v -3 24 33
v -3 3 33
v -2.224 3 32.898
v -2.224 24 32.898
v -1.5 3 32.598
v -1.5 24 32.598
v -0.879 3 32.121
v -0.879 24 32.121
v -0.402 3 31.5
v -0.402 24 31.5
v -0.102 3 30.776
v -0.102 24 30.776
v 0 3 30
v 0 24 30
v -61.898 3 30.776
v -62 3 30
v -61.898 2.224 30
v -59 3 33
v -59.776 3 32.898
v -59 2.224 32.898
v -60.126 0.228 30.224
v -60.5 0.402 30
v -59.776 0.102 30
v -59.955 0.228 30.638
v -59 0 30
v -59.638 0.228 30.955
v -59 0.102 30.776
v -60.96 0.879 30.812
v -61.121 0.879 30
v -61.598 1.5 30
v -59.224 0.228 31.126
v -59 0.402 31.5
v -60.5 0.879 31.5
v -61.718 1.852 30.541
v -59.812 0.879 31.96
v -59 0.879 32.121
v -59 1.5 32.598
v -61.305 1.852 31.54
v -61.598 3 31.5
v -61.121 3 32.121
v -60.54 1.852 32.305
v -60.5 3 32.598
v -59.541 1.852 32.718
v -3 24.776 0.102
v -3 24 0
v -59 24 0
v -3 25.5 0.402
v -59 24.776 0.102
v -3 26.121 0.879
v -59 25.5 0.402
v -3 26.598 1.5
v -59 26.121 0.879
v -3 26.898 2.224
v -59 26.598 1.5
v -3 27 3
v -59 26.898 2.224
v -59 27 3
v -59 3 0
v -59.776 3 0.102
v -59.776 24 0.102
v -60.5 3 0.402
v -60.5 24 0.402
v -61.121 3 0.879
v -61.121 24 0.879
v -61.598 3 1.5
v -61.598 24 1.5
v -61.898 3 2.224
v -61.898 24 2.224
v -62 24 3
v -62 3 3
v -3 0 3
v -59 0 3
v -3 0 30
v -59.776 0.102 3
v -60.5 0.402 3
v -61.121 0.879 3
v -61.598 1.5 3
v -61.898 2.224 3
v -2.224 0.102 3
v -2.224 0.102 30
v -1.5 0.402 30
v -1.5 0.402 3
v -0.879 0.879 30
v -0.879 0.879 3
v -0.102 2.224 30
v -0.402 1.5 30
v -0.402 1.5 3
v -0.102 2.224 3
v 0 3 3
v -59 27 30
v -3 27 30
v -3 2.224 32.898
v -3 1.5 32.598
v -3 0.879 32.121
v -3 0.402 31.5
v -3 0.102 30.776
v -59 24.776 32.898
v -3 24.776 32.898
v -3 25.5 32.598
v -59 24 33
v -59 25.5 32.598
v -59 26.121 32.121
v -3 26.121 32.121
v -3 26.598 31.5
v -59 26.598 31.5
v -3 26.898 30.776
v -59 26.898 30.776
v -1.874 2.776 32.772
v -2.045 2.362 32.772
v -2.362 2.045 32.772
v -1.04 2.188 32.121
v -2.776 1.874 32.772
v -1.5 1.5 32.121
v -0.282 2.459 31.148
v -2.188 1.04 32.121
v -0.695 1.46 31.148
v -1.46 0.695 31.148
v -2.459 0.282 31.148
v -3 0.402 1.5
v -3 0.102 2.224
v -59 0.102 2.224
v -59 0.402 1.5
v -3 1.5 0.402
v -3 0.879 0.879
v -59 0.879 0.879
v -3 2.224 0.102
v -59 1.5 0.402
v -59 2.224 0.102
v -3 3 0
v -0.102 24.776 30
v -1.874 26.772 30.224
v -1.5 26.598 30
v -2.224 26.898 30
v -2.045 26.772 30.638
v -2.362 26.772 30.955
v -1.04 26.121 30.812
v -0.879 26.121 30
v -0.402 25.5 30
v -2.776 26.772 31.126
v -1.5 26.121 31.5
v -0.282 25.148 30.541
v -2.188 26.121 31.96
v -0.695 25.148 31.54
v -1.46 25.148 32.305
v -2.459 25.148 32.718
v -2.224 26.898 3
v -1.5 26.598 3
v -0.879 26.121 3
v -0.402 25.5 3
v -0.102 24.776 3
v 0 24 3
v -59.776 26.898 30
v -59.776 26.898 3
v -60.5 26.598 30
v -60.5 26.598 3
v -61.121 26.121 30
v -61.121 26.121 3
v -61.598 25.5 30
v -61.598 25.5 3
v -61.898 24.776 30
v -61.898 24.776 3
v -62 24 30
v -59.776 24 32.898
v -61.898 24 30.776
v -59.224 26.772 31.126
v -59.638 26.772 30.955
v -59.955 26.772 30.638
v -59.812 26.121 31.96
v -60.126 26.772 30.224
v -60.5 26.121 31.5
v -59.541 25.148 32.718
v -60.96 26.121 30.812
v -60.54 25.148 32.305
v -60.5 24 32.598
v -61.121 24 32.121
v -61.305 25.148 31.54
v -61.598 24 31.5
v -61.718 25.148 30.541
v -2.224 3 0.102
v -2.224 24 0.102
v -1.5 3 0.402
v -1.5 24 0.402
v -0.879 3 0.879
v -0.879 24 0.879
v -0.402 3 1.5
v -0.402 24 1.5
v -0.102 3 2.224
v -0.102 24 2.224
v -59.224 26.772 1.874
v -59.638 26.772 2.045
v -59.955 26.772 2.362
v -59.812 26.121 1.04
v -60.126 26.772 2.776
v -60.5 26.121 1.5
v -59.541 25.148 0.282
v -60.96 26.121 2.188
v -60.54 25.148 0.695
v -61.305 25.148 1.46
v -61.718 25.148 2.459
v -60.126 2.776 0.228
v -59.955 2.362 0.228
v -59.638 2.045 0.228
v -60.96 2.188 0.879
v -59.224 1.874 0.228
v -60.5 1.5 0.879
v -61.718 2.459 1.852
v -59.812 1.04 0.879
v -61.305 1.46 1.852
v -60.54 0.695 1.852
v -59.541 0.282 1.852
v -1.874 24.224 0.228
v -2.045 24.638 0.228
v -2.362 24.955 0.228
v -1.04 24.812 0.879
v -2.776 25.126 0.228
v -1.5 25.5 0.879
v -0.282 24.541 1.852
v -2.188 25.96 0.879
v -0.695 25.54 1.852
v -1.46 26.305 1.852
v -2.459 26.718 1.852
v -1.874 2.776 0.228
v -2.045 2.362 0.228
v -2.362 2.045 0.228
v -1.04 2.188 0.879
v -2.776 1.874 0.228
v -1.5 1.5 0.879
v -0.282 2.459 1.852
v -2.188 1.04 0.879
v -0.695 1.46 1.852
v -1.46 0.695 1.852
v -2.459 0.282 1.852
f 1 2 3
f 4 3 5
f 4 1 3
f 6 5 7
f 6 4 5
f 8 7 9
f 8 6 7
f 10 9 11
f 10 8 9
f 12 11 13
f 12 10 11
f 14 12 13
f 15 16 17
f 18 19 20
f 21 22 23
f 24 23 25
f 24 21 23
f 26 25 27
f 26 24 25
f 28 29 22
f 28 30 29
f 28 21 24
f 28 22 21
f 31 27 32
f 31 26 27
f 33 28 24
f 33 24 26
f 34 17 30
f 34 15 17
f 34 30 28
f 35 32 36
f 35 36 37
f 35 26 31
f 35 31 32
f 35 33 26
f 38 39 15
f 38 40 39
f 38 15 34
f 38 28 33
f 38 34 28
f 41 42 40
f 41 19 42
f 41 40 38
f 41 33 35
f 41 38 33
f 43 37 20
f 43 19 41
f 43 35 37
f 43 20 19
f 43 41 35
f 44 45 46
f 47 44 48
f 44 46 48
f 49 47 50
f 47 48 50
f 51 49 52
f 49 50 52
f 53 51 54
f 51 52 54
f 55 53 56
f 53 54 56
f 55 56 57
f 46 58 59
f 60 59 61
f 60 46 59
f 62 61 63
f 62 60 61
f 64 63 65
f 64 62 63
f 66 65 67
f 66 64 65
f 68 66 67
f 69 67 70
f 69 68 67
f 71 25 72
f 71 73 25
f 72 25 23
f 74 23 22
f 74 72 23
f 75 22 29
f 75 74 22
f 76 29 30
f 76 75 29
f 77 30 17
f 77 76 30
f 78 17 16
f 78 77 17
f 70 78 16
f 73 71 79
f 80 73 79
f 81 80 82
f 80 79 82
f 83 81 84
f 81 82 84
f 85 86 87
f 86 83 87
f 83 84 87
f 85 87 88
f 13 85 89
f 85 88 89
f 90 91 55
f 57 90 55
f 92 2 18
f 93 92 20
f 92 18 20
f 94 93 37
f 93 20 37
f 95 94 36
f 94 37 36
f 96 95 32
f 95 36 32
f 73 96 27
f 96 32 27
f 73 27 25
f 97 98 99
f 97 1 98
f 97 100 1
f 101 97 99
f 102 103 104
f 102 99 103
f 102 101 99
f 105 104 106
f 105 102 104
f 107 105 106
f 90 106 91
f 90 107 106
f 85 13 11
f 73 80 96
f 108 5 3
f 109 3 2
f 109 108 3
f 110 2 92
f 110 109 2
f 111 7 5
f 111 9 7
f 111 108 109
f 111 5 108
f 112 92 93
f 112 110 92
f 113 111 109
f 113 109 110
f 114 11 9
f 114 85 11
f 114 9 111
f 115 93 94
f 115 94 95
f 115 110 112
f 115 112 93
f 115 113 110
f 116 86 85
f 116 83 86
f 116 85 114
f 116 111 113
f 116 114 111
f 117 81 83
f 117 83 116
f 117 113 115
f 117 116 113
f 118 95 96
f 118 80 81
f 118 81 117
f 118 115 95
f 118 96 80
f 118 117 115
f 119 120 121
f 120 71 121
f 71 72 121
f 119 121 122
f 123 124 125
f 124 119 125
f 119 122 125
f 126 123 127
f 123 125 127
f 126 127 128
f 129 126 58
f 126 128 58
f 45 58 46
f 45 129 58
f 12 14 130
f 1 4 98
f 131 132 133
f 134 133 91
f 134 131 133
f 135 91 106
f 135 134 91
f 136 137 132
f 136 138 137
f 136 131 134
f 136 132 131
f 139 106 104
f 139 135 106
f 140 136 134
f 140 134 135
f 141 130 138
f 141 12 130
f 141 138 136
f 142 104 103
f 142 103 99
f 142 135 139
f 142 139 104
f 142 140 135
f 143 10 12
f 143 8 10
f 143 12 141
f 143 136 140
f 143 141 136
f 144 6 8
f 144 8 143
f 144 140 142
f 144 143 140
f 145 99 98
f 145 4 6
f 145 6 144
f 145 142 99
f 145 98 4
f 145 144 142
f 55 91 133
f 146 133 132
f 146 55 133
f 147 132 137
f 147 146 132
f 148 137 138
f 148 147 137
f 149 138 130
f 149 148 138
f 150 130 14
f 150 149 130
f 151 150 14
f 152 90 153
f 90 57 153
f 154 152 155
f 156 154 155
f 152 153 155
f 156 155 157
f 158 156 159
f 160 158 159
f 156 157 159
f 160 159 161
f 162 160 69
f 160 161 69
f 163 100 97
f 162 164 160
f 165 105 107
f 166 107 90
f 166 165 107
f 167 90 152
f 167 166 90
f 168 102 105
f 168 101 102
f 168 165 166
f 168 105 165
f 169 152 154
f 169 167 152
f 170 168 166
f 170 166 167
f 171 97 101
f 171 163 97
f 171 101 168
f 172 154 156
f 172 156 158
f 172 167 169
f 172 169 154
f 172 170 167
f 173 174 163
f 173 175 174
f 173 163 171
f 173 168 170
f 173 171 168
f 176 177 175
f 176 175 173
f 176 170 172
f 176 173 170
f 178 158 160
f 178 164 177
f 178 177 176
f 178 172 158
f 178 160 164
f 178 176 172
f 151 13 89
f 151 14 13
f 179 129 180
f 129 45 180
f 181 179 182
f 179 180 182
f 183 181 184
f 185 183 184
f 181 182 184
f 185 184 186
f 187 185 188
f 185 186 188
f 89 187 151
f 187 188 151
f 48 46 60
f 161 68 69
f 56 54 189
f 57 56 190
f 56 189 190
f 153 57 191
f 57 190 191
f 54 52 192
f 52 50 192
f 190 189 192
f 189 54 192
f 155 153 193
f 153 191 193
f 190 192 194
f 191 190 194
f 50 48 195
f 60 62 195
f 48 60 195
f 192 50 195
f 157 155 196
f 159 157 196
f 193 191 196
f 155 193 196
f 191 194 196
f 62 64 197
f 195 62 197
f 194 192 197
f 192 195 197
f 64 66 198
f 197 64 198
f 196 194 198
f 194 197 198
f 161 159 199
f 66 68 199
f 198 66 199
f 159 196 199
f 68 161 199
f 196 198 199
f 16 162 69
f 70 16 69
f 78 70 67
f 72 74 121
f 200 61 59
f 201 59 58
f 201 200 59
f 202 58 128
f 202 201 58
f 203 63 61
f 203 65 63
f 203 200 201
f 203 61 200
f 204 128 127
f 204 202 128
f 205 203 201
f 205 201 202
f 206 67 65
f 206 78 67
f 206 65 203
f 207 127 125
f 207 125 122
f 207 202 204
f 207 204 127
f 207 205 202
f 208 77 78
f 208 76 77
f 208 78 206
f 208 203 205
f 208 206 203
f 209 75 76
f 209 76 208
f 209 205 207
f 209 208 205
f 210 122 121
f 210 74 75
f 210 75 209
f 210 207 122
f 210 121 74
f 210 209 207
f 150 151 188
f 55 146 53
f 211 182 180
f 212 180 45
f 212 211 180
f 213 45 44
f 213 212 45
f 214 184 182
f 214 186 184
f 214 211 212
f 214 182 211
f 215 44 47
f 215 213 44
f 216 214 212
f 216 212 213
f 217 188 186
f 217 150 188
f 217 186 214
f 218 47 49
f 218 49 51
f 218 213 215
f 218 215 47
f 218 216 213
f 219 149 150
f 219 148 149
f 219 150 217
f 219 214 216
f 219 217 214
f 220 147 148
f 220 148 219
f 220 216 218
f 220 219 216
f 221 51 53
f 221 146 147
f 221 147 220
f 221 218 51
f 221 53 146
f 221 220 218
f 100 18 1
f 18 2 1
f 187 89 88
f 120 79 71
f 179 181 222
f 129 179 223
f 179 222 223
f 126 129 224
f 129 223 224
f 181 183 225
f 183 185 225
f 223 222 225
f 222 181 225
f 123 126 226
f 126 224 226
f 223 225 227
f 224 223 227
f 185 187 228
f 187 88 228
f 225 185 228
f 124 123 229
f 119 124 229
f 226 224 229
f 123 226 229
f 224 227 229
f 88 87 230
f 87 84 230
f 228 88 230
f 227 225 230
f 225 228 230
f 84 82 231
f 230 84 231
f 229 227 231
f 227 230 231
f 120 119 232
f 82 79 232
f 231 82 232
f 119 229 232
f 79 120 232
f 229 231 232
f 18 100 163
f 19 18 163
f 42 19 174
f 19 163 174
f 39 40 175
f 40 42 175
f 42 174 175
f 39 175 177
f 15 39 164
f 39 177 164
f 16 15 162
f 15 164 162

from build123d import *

# Parameters (mm, degrees)
SKETCH1_W           = 33
SKETCH1_H           = 27
BOSS_EXTRUDE1_DEPTH = 62
FILLET1_R           = 3


with BuildPart() as part:
    # Sketch1 → Boss-Extrude1 (new body)
    with BuildSketch(Plane(origin=(0, 0, 0), x_dir=(0, 0, -1), z_dir=(1, 0, 0))):
        with Locations((-16.5, 13.5)):
            Rectangle(SKETCH1_W, SKETCH1_H)
    extrude(amount=-BOSS_EXTRUDE1_DEPTH)

    # Fillet1
    fillet1_edges = [part.edges().sort_by_distance(p)[0] for p in [
        (-62, 13.5, 33),
        (-62, 0, 16.5),
        (-62, 13.5, 0),
        (0, 0, 16.5),
        (0, 13.5, 33),
        (0, 27, 16.5),
        (0, 13.5, 0),
        (-31, 0, 0),
        (-31, 0, 33),
        (-31, 27, 33),
        (-31, 27, 0),
        (-62, 27, 16.5),
    ]]
    fillet(fillet1_edges, radius=FILLET1_R)


solid = part.part
